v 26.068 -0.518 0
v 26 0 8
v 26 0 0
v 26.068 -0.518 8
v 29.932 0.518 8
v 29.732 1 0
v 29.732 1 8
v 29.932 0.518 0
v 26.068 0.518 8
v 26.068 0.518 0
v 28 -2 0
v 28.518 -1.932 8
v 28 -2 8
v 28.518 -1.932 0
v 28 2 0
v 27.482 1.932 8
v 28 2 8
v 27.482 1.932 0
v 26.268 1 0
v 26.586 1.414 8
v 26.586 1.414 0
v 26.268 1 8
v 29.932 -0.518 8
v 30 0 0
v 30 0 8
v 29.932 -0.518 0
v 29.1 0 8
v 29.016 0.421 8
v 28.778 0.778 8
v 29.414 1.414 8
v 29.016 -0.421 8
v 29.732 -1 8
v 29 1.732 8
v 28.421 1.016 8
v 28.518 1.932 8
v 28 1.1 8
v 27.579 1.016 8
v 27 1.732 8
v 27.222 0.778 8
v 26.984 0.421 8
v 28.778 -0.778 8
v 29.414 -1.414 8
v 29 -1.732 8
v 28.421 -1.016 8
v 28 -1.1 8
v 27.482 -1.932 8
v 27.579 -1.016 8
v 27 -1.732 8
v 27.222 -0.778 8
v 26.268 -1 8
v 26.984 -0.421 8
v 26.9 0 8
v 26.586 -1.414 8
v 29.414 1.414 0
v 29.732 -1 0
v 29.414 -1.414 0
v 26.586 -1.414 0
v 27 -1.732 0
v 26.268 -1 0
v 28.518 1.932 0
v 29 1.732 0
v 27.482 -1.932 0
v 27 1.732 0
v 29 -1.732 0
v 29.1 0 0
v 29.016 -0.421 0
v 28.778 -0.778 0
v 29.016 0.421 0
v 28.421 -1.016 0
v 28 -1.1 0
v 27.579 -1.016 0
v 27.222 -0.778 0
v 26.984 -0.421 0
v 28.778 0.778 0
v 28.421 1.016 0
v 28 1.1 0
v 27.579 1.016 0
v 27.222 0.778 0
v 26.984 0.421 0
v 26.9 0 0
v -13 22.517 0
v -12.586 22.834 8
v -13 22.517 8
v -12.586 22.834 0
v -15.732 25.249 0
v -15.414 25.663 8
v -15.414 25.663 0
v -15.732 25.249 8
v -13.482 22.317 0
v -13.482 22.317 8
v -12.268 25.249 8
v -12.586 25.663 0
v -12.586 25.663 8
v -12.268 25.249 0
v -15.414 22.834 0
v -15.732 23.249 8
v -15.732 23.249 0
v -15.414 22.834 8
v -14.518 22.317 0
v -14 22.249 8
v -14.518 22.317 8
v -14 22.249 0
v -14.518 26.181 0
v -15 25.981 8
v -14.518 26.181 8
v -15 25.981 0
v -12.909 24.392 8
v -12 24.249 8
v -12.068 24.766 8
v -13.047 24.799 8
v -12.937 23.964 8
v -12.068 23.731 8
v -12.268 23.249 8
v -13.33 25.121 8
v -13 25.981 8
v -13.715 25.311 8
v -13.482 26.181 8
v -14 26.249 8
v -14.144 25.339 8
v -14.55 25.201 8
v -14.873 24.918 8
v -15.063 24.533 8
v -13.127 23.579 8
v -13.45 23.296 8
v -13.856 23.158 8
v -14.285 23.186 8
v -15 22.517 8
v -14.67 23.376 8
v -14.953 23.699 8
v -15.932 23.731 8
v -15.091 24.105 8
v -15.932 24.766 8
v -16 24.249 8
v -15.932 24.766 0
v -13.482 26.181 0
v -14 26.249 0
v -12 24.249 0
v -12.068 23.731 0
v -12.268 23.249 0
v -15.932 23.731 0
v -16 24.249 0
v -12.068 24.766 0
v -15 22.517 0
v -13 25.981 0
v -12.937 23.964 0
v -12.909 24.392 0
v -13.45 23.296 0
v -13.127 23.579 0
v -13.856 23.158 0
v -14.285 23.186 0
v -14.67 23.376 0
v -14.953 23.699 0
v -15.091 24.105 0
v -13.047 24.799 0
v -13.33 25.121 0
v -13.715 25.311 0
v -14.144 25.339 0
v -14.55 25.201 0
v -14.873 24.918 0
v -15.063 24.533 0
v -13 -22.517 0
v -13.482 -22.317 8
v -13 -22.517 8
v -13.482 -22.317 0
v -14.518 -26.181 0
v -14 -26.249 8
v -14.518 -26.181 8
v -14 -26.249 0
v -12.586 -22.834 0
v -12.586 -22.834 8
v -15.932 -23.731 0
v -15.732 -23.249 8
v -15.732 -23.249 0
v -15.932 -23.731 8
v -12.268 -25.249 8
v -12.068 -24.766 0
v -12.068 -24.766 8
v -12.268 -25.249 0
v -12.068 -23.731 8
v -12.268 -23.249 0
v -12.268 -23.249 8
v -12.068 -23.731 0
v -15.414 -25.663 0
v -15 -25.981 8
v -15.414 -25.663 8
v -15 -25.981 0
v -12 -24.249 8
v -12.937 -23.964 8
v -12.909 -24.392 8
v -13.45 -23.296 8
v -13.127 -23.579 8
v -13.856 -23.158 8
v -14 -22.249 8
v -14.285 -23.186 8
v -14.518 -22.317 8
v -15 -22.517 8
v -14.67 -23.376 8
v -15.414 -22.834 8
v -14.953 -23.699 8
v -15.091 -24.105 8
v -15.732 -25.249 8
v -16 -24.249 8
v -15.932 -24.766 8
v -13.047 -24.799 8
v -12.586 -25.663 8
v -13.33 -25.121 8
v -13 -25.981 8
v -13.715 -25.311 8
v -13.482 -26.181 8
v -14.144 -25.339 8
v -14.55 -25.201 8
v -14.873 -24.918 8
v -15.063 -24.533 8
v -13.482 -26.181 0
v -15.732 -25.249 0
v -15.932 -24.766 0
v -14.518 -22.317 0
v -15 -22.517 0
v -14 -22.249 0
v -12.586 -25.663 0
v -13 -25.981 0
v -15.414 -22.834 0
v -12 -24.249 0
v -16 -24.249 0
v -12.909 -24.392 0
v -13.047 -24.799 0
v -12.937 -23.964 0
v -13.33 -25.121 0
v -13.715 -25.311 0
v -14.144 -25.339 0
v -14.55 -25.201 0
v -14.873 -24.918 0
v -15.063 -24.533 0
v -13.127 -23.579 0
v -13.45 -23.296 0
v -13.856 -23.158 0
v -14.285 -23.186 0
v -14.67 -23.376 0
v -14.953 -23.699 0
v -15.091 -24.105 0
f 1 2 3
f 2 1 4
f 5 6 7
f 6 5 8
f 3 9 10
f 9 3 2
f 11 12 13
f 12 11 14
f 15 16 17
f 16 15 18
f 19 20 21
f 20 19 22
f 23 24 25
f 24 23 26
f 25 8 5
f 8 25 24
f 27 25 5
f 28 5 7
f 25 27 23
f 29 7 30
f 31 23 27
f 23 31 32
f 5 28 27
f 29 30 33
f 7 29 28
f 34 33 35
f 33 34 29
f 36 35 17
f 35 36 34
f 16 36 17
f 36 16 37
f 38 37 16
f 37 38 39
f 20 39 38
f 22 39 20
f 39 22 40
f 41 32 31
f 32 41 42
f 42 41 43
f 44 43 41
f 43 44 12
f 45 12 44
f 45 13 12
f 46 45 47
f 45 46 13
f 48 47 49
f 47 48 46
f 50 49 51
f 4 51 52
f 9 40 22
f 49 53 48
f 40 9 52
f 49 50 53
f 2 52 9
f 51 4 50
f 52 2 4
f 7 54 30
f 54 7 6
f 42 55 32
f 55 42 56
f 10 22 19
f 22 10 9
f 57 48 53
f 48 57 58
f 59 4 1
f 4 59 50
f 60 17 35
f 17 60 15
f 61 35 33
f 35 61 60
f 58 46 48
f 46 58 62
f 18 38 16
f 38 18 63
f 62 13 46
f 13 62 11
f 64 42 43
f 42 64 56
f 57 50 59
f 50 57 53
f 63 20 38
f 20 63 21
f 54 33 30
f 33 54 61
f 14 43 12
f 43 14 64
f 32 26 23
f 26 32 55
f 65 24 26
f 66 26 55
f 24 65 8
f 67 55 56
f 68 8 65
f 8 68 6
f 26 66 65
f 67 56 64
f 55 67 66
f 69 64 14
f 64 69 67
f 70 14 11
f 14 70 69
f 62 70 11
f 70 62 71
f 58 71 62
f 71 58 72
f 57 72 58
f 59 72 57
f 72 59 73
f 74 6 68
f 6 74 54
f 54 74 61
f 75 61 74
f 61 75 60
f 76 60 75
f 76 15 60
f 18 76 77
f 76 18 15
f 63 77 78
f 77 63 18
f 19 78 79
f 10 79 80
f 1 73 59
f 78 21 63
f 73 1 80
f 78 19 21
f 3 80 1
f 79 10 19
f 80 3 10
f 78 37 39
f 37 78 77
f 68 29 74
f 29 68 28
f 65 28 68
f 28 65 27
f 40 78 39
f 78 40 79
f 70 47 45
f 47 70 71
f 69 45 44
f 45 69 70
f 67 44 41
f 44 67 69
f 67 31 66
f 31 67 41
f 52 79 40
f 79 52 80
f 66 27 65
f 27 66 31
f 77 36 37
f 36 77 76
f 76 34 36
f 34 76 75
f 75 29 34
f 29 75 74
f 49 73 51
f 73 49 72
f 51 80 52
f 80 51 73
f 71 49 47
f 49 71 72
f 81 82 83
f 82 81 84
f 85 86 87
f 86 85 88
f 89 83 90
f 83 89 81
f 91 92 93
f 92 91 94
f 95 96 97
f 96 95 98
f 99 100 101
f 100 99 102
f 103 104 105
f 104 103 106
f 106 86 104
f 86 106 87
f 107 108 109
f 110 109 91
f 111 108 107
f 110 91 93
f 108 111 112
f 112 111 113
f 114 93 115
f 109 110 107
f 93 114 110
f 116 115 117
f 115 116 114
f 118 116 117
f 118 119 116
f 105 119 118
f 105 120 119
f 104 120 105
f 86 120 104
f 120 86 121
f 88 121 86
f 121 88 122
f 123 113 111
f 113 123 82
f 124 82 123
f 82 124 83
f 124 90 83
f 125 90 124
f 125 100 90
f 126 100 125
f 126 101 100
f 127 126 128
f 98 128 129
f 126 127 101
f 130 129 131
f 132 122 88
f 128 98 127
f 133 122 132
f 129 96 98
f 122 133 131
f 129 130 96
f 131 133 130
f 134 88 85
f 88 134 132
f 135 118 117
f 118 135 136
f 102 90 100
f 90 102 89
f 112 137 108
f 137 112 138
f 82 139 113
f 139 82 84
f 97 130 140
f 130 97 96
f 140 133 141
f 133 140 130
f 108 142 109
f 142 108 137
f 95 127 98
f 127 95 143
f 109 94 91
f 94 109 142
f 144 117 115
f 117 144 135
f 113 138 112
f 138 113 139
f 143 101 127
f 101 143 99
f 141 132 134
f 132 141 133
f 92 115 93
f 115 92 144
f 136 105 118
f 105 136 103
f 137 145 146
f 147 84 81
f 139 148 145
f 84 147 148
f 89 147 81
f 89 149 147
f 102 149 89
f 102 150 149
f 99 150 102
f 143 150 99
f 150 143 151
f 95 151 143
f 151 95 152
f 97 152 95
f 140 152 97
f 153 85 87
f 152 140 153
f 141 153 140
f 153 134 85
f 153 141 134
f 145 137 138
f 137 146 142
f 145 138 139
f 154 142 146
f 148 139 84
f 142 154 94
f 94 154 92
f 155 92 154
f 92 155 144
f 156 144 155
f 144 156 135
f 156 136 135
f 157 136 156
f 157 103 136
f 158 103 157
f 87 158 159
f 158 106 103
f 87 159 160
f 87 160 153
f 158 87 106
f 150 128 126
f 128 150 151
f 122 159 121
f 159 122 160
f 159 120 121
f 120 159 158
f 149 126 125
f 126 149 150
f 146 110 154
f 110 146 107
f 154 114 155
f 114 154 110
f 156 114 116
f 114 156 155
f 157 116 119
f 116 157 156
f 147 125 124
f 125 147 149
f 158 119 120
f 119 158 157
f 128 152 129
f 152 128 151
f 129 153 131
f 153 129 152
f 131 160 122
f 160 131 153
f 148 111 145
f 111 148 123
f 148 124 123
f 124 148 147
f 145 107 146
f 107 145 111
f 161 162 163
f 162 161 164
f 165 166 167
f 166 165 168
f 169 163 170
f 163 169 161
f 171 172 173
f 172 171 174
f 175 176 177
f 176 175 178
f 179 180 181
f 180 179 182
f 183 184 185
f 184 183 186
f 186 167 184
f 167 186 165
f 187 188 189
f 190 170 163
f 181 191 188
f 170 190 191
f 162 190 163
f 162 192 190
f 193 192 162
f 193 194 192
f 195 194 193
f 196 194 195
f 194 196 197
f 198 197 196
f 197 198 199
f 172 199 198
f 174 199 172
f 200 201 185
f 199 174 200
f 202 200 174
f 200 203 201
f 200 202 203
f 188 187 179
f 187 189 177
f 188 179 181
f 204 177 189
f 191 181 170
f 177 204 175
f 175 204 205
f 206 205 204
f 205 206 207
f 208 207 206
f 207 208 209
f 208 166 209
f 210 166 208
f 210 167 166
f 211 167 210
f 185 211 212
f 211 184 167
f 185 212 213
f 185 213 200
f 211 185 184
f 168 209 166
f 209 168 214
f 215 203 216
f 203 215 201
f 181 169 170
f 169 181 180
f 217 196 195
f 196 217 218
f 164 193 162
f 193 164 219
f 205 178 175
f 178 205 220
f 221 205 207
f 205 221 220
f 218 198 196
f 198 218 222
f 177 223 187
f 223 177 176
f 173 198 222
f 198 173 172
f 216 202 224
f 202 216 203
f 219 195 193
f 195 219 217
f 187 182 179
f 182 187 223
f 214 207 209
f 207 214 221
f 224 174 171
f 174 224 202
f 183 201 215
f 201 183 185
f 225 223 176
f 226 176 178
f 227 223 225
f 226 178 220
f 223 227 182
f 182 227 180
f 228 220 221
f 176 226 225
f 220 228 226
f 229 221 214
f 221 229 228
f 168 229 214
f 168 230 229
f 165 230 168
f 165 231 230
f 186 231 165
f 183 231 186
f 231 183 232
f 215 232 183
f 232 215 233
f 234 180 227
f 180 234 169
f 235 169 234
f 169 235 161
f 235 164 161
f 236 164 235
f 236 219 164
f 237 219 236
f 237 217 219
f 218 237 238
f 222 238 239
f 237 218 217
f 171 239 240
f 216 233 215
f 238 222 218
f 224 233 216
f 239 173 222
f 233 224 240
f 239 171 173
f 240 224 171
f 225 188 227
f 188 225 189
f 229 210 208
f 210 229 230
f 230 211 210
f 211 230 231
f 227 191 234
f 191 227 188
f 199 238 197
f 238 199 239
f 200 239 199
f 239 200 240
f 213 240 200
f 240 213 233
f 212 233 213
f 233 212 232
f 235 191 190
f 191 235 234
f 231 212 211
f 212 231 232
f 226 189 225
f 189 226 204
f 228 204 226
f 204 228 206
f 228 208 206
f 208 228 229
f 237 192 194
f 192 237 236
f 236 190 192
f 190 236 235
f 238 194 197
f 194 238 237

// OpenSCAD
// ============================================================
// Orb V2 — PCB 安装支撑柱
// 3 点 120° 均布，M2 螺丝固定
// ============================================================

// --- 参数 ---
pcb_r          = 32.5;   // PCB 半径 65mm → 32.5mm
mount_offset_r = 28;     // 支撑柱到中心距离
mount_height   = 8;      // 支撑柱高度
mount_outer_r  = 2;      // 柱外径 4mm → 2mm
mount_hole_r   = 1.1;    // 螺孔半径 2.2mm → 1.1mm（M2 螺丝）
mount_angles   = [0, 120, 240]; // 3 点均布

module pcb_mounts() {
    for (angle = mount_angles) {
        rotate([0, 0, angle])
            translate([mount_offset_r, 0, 0])
                pcb_mount_post();
    }
}

module pcb_mount_post() {
    difference() {
        // 支撑柱
        cylinder(h = mount_height, r = mount_outer_r, $fn = 24);

        // 螺丝孔
        translate([0, 0, -0.1])
            cylinder(h = mount_height + 0.2, r = mount_hole_r, $fn = 16);
    }
}

// PCB 轮廓线（辅助可视化，不打印）
module pcb_outline() {
    color("blue", 0.3)
        translate([0, 0, mount_height])
            cylinder(h = 1.6, r = pcb_r, $fn = 80);
}

pcb_mounts();
// %pcb_outline();  // 取消注释可显示 PCB 轮廓
